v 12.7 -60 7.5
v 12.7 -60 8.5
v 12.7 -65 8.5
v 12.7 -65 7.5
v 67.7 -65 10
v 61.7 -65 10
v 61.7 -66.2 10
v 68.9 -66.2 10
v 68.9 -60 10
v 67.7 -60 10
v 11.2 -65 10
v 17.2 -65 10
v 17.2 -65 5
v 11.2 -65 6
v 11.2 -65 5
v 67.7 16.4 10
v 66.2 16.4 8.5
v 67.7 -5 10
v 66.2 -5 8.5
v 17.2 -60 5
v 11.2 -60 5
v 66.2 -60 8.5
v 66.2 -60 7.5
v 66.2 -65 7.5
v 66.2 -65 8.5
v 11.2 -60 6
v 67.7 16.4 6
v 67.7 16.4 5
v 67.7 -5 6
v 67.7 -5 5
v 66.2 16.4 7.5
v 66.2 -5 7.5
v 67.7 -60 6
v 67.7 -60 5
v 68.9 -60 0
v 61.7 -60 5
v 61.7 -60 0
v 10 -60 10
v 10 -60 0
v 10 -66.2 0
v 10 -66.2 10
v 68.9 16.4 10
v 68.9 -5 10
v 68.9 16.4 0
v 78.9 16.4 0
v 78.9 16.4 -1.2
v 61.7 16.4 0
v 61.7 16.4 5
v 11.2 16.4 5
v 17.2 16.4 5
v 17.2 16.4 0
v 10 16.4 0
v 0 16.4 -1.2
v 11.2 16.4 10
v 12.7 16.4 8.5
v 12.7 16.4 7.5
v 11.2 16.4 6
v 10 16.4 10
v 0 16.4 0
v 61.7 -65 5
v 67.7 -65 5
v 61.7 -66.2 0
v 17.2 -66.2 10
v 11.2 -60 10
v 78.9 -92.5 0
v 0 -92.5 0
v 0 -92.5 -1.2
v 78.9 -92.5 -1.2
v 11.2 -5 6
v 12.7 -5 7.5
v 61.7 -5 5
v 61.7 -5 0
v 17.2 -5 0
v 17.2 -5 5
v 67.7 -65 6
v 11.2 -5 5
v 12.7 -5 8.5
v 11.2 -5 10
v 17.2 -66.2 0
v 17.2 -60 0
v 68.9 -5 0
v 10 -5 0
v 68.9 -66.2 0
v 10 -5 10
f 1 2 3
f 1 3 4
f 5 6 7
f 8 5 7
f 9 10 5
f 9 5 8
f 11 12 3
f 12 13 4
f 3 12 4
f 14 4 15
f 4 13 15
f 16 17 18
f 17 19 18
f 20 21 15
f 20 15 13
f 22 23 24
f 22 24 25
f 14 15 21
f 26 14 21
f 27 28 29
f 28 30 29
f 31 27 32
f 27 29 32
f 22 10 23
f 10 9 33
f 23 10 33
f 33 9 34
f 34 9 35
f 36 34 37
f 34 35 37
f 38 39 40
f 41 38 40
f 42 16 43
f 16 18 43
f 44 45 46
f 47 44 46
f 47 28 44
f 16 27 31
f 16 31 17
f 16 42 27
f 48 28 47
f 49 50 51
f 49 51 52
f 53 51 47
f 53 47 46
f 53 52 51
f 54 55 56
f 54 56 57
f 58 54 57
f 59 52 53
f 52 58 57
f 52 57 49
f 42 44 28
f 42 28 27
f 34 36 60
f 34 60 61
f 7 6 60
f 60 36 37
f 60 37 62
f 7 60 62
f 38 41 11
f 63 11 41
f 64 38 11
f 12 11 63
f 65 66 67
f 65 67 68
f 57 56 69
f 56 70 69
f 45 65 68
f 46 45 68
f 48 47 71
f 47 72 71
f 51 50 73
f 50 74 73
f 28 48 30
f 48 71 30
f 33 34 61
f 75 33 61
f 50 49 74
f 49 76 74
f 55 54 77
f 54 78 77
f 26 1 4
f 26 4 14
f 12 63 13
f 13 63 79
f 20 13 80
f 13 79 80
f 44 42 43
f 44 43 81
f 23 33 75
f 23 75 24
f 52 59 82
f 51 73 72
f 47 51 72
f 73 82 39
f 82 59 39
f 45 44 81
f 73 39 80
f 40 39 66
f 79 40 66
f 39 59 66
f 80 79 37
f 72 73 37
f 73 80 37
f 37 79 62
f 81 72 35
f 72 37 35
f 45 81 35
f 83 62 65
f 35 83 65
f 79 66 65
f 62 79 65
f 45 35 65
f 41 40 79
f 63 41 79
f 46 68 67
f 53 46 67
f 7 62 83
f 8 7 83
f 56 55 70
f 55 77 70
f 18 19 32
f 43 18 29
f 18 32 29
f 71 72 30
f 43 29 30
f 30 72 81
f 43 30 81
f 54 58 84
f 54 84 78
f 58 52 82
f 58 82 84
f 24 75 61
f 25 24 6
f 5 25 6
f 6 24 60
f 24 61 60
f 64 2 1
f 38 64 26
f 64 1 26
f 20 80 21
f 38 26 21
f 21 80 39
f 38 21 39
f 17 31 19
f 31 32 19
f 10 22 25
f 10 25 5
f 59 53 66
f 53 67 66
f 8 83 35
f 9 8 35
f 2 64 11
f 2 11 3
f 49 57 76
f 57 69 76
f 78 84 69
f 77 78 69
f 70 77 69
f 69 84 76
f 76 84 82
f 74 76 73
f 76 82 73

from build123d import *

# Parameters (mm, degrees)
F0_W      = 6
F0_H      = 5
F0_W_2    = 1.2
F1_DEPTH  = 1.2
F2_DEPTH  = 5
F3_DEPTH  = 10
F5_DEPTH  = 65
F6_DEPTH  = 10
F1_FACE_W = 78.9
F1_FACE_H = 1.2
F7_DEPTH  = 16.3
F8_DEPTH  = 16.4


with BuildPart() as f1:
    # F0 (on Top) → F1 (new body)
    with BuildSketch(Plane.XY):
        with Locations((14.2, -2.5)):
            Rectangle(F0_W, F0_H)
        with Locations((10.6, -2.5)):
            Rectangle(F0_W_2, F0_H)
        Polygon((10, 0), (0, 0), (0, -76.2), (78.9, -76.2), (78.9, 0), (68.9, 0), (68.9, -5), (67.7, -5), (61.7, -5), (61.7, 0), (17.2, 0), (17.2, -5), (11.2, -5), (10, -5), align=None)
        Polygon((10, -60), (11.2, -60), (17.2, -60), (17.2, -65), (17.2, -66.2), (10, -66.2), align=None, mode=Mode.SUBTRACT)
        Polygon((61.7, -65), (61.7, -60), (67.7, -60), (68.9, -60), (68.9, -66.2), (61.7, -66.2), align=None, mode=Mode.SUBTRACT)
        with Locations((64.7, -2.5)):
            Rectangle(F0_W, F0_H)
        with Locations((68.3, -2.5)):
            Rectangle(F0_W_2, F0_H)
        with Locations((64.7, -62.5)):
            Rectangle(F0_W, F0_H)
        Polygon((68.9, -60), (67.7, -60), (67.7, -65), (61.7, -65), (61.7, -66.2), (68.9, -66.2), align=None)
        with Locations((14.2, -62.5)):
            Rectangle(F0_W, F0_H)
        Polygon((11.2, -65), (11.2, -60), (10, -60), (10, -66.2), (17.2, -66.2), (17.2, -65), align=None)
    extrude(amount=-F1_DEPTH)

    # F0 (on Top) → F2 (join)
    with BuildSketch(Plane.XY):
        with Locations((14.2, -2.5)):
            Rectangle(F0_W, F0_H)
        with Locations((14.2, -62.5)):
            Rectangle(F0_W, F0_H)
        with Locations((64.7, -2.5)):
            Rectangle(F0_W, F0_H)
        with Locations((64.7, -62.5)):
            Rectangle(F0_W, F0_H)
    extrude(amount=F2_DEPTH)

    # F0 (on Top) → F3 (join)
    with BuildSketch(Plane.XY):
        Polygon((11.2, -65), (11.2, -60), (10, -60), (10, -66.2), (17.2, -66.2), (17.2, -65), align=None)
        Polygon((68.9, -60), (67.7, -60), (67.7, -65), (61.7, -65), (61.7, -66.2), (68.9, -66.2), align=None)
        with Locations((68.3, -2.5)):
            Rectangle(F0_W_2, F0_H)
        with Locations((10.6, -2.5)):
            Rectangle(F0_W_2, F0_H)
    extrude(amount=F3_DEPTH)

    # F4 (on face) → F5 (join, through all)
    with BuildSketch(Plane(origin=(0, 0, 0), x_dir=(-1, 0, 0), z_dir=(0, 1, 0))):
        Polygon((-11.2, 6), (-11.2, 10), (-12.7, 8.5), (-12.7, 7.5), align=None)
        Polygon((-66.2, 7.5), (-66.2, 8.5), (-67.7, 10), (-67.7, 6), align=None)
    extrude(amount=-F5_DEPTH)

    # F0 (on Top) → F6 (cut, through all)
    with BuildSketch(Plane.XY):
        Polygon((10, 0), (0, 0), (0, -76.2), (78.9, -76.2), (78.9, 0), (68.9, 0), (68.9, -5), (67.7, -5), (61.7, -5), (61.7, 0), (17.2, 0), (17.2, -5), (11.2, -5), (10, -5), align=None)
        Polygon((10, -60), (11.2, -60), (17.2, -60), (17.2, -65), (17.2, -66.2), (10, -66.2), align=None, mode=Mode.SUBTRACT)
        Polygon((61.7, -65), (61.7, -60), (67.7, -60), (68.9, -60), (68.9, -66.2), (61.7, -66.2), align=None, mode=Mode.SUBTRACT)
    extrude(amount=F6_DEPTH, mode=Mode.SUBTRACT)

    # F1_face (on face) → F7 (join)
    with BuildSketch(Plane(origin=(39.45, -76.2, -0.6), x_dir=(1, 0, 0), z_dir=(0, -1, 0))):
        Rectangle(F1_FACE_W, F1_FACE_H)
    extrude(amount=F7_DEPTH)

    # F5_face (on face) → F8 (join)
    with BuildSketch(Plane(origin=(39.45, 0, 1.467354), x_dir=(-1, 0, 0), z_dir=(0, 1, 0))):
        Polygon((-39.45, -2.667354), (39.45, -2.667354), (39.45, -1.467354), (29.45, -1.467354), (29.45, 8.532646), (28.25, 8.532646), (26.75, 7.032646), (26.75, 6.032646), (28.25, 4.532646), (28.25, 3.532646), (22.25, 3.532646), (22.25, -1.467354), (-22.25, -1.467354), (-22.25, 3.532646), (-28.25, 3.532646), (-28.25, 4.532646), (-26.75, 6.032646), (-26.75, 7.032646), (-28.25, 8.532646), (-29.45, 8.532646), (-29.45, -1.467354), (-39.45, -1.467354), align=None)
    extrude(amount=F8_DEPTH)


solid = f1.part
